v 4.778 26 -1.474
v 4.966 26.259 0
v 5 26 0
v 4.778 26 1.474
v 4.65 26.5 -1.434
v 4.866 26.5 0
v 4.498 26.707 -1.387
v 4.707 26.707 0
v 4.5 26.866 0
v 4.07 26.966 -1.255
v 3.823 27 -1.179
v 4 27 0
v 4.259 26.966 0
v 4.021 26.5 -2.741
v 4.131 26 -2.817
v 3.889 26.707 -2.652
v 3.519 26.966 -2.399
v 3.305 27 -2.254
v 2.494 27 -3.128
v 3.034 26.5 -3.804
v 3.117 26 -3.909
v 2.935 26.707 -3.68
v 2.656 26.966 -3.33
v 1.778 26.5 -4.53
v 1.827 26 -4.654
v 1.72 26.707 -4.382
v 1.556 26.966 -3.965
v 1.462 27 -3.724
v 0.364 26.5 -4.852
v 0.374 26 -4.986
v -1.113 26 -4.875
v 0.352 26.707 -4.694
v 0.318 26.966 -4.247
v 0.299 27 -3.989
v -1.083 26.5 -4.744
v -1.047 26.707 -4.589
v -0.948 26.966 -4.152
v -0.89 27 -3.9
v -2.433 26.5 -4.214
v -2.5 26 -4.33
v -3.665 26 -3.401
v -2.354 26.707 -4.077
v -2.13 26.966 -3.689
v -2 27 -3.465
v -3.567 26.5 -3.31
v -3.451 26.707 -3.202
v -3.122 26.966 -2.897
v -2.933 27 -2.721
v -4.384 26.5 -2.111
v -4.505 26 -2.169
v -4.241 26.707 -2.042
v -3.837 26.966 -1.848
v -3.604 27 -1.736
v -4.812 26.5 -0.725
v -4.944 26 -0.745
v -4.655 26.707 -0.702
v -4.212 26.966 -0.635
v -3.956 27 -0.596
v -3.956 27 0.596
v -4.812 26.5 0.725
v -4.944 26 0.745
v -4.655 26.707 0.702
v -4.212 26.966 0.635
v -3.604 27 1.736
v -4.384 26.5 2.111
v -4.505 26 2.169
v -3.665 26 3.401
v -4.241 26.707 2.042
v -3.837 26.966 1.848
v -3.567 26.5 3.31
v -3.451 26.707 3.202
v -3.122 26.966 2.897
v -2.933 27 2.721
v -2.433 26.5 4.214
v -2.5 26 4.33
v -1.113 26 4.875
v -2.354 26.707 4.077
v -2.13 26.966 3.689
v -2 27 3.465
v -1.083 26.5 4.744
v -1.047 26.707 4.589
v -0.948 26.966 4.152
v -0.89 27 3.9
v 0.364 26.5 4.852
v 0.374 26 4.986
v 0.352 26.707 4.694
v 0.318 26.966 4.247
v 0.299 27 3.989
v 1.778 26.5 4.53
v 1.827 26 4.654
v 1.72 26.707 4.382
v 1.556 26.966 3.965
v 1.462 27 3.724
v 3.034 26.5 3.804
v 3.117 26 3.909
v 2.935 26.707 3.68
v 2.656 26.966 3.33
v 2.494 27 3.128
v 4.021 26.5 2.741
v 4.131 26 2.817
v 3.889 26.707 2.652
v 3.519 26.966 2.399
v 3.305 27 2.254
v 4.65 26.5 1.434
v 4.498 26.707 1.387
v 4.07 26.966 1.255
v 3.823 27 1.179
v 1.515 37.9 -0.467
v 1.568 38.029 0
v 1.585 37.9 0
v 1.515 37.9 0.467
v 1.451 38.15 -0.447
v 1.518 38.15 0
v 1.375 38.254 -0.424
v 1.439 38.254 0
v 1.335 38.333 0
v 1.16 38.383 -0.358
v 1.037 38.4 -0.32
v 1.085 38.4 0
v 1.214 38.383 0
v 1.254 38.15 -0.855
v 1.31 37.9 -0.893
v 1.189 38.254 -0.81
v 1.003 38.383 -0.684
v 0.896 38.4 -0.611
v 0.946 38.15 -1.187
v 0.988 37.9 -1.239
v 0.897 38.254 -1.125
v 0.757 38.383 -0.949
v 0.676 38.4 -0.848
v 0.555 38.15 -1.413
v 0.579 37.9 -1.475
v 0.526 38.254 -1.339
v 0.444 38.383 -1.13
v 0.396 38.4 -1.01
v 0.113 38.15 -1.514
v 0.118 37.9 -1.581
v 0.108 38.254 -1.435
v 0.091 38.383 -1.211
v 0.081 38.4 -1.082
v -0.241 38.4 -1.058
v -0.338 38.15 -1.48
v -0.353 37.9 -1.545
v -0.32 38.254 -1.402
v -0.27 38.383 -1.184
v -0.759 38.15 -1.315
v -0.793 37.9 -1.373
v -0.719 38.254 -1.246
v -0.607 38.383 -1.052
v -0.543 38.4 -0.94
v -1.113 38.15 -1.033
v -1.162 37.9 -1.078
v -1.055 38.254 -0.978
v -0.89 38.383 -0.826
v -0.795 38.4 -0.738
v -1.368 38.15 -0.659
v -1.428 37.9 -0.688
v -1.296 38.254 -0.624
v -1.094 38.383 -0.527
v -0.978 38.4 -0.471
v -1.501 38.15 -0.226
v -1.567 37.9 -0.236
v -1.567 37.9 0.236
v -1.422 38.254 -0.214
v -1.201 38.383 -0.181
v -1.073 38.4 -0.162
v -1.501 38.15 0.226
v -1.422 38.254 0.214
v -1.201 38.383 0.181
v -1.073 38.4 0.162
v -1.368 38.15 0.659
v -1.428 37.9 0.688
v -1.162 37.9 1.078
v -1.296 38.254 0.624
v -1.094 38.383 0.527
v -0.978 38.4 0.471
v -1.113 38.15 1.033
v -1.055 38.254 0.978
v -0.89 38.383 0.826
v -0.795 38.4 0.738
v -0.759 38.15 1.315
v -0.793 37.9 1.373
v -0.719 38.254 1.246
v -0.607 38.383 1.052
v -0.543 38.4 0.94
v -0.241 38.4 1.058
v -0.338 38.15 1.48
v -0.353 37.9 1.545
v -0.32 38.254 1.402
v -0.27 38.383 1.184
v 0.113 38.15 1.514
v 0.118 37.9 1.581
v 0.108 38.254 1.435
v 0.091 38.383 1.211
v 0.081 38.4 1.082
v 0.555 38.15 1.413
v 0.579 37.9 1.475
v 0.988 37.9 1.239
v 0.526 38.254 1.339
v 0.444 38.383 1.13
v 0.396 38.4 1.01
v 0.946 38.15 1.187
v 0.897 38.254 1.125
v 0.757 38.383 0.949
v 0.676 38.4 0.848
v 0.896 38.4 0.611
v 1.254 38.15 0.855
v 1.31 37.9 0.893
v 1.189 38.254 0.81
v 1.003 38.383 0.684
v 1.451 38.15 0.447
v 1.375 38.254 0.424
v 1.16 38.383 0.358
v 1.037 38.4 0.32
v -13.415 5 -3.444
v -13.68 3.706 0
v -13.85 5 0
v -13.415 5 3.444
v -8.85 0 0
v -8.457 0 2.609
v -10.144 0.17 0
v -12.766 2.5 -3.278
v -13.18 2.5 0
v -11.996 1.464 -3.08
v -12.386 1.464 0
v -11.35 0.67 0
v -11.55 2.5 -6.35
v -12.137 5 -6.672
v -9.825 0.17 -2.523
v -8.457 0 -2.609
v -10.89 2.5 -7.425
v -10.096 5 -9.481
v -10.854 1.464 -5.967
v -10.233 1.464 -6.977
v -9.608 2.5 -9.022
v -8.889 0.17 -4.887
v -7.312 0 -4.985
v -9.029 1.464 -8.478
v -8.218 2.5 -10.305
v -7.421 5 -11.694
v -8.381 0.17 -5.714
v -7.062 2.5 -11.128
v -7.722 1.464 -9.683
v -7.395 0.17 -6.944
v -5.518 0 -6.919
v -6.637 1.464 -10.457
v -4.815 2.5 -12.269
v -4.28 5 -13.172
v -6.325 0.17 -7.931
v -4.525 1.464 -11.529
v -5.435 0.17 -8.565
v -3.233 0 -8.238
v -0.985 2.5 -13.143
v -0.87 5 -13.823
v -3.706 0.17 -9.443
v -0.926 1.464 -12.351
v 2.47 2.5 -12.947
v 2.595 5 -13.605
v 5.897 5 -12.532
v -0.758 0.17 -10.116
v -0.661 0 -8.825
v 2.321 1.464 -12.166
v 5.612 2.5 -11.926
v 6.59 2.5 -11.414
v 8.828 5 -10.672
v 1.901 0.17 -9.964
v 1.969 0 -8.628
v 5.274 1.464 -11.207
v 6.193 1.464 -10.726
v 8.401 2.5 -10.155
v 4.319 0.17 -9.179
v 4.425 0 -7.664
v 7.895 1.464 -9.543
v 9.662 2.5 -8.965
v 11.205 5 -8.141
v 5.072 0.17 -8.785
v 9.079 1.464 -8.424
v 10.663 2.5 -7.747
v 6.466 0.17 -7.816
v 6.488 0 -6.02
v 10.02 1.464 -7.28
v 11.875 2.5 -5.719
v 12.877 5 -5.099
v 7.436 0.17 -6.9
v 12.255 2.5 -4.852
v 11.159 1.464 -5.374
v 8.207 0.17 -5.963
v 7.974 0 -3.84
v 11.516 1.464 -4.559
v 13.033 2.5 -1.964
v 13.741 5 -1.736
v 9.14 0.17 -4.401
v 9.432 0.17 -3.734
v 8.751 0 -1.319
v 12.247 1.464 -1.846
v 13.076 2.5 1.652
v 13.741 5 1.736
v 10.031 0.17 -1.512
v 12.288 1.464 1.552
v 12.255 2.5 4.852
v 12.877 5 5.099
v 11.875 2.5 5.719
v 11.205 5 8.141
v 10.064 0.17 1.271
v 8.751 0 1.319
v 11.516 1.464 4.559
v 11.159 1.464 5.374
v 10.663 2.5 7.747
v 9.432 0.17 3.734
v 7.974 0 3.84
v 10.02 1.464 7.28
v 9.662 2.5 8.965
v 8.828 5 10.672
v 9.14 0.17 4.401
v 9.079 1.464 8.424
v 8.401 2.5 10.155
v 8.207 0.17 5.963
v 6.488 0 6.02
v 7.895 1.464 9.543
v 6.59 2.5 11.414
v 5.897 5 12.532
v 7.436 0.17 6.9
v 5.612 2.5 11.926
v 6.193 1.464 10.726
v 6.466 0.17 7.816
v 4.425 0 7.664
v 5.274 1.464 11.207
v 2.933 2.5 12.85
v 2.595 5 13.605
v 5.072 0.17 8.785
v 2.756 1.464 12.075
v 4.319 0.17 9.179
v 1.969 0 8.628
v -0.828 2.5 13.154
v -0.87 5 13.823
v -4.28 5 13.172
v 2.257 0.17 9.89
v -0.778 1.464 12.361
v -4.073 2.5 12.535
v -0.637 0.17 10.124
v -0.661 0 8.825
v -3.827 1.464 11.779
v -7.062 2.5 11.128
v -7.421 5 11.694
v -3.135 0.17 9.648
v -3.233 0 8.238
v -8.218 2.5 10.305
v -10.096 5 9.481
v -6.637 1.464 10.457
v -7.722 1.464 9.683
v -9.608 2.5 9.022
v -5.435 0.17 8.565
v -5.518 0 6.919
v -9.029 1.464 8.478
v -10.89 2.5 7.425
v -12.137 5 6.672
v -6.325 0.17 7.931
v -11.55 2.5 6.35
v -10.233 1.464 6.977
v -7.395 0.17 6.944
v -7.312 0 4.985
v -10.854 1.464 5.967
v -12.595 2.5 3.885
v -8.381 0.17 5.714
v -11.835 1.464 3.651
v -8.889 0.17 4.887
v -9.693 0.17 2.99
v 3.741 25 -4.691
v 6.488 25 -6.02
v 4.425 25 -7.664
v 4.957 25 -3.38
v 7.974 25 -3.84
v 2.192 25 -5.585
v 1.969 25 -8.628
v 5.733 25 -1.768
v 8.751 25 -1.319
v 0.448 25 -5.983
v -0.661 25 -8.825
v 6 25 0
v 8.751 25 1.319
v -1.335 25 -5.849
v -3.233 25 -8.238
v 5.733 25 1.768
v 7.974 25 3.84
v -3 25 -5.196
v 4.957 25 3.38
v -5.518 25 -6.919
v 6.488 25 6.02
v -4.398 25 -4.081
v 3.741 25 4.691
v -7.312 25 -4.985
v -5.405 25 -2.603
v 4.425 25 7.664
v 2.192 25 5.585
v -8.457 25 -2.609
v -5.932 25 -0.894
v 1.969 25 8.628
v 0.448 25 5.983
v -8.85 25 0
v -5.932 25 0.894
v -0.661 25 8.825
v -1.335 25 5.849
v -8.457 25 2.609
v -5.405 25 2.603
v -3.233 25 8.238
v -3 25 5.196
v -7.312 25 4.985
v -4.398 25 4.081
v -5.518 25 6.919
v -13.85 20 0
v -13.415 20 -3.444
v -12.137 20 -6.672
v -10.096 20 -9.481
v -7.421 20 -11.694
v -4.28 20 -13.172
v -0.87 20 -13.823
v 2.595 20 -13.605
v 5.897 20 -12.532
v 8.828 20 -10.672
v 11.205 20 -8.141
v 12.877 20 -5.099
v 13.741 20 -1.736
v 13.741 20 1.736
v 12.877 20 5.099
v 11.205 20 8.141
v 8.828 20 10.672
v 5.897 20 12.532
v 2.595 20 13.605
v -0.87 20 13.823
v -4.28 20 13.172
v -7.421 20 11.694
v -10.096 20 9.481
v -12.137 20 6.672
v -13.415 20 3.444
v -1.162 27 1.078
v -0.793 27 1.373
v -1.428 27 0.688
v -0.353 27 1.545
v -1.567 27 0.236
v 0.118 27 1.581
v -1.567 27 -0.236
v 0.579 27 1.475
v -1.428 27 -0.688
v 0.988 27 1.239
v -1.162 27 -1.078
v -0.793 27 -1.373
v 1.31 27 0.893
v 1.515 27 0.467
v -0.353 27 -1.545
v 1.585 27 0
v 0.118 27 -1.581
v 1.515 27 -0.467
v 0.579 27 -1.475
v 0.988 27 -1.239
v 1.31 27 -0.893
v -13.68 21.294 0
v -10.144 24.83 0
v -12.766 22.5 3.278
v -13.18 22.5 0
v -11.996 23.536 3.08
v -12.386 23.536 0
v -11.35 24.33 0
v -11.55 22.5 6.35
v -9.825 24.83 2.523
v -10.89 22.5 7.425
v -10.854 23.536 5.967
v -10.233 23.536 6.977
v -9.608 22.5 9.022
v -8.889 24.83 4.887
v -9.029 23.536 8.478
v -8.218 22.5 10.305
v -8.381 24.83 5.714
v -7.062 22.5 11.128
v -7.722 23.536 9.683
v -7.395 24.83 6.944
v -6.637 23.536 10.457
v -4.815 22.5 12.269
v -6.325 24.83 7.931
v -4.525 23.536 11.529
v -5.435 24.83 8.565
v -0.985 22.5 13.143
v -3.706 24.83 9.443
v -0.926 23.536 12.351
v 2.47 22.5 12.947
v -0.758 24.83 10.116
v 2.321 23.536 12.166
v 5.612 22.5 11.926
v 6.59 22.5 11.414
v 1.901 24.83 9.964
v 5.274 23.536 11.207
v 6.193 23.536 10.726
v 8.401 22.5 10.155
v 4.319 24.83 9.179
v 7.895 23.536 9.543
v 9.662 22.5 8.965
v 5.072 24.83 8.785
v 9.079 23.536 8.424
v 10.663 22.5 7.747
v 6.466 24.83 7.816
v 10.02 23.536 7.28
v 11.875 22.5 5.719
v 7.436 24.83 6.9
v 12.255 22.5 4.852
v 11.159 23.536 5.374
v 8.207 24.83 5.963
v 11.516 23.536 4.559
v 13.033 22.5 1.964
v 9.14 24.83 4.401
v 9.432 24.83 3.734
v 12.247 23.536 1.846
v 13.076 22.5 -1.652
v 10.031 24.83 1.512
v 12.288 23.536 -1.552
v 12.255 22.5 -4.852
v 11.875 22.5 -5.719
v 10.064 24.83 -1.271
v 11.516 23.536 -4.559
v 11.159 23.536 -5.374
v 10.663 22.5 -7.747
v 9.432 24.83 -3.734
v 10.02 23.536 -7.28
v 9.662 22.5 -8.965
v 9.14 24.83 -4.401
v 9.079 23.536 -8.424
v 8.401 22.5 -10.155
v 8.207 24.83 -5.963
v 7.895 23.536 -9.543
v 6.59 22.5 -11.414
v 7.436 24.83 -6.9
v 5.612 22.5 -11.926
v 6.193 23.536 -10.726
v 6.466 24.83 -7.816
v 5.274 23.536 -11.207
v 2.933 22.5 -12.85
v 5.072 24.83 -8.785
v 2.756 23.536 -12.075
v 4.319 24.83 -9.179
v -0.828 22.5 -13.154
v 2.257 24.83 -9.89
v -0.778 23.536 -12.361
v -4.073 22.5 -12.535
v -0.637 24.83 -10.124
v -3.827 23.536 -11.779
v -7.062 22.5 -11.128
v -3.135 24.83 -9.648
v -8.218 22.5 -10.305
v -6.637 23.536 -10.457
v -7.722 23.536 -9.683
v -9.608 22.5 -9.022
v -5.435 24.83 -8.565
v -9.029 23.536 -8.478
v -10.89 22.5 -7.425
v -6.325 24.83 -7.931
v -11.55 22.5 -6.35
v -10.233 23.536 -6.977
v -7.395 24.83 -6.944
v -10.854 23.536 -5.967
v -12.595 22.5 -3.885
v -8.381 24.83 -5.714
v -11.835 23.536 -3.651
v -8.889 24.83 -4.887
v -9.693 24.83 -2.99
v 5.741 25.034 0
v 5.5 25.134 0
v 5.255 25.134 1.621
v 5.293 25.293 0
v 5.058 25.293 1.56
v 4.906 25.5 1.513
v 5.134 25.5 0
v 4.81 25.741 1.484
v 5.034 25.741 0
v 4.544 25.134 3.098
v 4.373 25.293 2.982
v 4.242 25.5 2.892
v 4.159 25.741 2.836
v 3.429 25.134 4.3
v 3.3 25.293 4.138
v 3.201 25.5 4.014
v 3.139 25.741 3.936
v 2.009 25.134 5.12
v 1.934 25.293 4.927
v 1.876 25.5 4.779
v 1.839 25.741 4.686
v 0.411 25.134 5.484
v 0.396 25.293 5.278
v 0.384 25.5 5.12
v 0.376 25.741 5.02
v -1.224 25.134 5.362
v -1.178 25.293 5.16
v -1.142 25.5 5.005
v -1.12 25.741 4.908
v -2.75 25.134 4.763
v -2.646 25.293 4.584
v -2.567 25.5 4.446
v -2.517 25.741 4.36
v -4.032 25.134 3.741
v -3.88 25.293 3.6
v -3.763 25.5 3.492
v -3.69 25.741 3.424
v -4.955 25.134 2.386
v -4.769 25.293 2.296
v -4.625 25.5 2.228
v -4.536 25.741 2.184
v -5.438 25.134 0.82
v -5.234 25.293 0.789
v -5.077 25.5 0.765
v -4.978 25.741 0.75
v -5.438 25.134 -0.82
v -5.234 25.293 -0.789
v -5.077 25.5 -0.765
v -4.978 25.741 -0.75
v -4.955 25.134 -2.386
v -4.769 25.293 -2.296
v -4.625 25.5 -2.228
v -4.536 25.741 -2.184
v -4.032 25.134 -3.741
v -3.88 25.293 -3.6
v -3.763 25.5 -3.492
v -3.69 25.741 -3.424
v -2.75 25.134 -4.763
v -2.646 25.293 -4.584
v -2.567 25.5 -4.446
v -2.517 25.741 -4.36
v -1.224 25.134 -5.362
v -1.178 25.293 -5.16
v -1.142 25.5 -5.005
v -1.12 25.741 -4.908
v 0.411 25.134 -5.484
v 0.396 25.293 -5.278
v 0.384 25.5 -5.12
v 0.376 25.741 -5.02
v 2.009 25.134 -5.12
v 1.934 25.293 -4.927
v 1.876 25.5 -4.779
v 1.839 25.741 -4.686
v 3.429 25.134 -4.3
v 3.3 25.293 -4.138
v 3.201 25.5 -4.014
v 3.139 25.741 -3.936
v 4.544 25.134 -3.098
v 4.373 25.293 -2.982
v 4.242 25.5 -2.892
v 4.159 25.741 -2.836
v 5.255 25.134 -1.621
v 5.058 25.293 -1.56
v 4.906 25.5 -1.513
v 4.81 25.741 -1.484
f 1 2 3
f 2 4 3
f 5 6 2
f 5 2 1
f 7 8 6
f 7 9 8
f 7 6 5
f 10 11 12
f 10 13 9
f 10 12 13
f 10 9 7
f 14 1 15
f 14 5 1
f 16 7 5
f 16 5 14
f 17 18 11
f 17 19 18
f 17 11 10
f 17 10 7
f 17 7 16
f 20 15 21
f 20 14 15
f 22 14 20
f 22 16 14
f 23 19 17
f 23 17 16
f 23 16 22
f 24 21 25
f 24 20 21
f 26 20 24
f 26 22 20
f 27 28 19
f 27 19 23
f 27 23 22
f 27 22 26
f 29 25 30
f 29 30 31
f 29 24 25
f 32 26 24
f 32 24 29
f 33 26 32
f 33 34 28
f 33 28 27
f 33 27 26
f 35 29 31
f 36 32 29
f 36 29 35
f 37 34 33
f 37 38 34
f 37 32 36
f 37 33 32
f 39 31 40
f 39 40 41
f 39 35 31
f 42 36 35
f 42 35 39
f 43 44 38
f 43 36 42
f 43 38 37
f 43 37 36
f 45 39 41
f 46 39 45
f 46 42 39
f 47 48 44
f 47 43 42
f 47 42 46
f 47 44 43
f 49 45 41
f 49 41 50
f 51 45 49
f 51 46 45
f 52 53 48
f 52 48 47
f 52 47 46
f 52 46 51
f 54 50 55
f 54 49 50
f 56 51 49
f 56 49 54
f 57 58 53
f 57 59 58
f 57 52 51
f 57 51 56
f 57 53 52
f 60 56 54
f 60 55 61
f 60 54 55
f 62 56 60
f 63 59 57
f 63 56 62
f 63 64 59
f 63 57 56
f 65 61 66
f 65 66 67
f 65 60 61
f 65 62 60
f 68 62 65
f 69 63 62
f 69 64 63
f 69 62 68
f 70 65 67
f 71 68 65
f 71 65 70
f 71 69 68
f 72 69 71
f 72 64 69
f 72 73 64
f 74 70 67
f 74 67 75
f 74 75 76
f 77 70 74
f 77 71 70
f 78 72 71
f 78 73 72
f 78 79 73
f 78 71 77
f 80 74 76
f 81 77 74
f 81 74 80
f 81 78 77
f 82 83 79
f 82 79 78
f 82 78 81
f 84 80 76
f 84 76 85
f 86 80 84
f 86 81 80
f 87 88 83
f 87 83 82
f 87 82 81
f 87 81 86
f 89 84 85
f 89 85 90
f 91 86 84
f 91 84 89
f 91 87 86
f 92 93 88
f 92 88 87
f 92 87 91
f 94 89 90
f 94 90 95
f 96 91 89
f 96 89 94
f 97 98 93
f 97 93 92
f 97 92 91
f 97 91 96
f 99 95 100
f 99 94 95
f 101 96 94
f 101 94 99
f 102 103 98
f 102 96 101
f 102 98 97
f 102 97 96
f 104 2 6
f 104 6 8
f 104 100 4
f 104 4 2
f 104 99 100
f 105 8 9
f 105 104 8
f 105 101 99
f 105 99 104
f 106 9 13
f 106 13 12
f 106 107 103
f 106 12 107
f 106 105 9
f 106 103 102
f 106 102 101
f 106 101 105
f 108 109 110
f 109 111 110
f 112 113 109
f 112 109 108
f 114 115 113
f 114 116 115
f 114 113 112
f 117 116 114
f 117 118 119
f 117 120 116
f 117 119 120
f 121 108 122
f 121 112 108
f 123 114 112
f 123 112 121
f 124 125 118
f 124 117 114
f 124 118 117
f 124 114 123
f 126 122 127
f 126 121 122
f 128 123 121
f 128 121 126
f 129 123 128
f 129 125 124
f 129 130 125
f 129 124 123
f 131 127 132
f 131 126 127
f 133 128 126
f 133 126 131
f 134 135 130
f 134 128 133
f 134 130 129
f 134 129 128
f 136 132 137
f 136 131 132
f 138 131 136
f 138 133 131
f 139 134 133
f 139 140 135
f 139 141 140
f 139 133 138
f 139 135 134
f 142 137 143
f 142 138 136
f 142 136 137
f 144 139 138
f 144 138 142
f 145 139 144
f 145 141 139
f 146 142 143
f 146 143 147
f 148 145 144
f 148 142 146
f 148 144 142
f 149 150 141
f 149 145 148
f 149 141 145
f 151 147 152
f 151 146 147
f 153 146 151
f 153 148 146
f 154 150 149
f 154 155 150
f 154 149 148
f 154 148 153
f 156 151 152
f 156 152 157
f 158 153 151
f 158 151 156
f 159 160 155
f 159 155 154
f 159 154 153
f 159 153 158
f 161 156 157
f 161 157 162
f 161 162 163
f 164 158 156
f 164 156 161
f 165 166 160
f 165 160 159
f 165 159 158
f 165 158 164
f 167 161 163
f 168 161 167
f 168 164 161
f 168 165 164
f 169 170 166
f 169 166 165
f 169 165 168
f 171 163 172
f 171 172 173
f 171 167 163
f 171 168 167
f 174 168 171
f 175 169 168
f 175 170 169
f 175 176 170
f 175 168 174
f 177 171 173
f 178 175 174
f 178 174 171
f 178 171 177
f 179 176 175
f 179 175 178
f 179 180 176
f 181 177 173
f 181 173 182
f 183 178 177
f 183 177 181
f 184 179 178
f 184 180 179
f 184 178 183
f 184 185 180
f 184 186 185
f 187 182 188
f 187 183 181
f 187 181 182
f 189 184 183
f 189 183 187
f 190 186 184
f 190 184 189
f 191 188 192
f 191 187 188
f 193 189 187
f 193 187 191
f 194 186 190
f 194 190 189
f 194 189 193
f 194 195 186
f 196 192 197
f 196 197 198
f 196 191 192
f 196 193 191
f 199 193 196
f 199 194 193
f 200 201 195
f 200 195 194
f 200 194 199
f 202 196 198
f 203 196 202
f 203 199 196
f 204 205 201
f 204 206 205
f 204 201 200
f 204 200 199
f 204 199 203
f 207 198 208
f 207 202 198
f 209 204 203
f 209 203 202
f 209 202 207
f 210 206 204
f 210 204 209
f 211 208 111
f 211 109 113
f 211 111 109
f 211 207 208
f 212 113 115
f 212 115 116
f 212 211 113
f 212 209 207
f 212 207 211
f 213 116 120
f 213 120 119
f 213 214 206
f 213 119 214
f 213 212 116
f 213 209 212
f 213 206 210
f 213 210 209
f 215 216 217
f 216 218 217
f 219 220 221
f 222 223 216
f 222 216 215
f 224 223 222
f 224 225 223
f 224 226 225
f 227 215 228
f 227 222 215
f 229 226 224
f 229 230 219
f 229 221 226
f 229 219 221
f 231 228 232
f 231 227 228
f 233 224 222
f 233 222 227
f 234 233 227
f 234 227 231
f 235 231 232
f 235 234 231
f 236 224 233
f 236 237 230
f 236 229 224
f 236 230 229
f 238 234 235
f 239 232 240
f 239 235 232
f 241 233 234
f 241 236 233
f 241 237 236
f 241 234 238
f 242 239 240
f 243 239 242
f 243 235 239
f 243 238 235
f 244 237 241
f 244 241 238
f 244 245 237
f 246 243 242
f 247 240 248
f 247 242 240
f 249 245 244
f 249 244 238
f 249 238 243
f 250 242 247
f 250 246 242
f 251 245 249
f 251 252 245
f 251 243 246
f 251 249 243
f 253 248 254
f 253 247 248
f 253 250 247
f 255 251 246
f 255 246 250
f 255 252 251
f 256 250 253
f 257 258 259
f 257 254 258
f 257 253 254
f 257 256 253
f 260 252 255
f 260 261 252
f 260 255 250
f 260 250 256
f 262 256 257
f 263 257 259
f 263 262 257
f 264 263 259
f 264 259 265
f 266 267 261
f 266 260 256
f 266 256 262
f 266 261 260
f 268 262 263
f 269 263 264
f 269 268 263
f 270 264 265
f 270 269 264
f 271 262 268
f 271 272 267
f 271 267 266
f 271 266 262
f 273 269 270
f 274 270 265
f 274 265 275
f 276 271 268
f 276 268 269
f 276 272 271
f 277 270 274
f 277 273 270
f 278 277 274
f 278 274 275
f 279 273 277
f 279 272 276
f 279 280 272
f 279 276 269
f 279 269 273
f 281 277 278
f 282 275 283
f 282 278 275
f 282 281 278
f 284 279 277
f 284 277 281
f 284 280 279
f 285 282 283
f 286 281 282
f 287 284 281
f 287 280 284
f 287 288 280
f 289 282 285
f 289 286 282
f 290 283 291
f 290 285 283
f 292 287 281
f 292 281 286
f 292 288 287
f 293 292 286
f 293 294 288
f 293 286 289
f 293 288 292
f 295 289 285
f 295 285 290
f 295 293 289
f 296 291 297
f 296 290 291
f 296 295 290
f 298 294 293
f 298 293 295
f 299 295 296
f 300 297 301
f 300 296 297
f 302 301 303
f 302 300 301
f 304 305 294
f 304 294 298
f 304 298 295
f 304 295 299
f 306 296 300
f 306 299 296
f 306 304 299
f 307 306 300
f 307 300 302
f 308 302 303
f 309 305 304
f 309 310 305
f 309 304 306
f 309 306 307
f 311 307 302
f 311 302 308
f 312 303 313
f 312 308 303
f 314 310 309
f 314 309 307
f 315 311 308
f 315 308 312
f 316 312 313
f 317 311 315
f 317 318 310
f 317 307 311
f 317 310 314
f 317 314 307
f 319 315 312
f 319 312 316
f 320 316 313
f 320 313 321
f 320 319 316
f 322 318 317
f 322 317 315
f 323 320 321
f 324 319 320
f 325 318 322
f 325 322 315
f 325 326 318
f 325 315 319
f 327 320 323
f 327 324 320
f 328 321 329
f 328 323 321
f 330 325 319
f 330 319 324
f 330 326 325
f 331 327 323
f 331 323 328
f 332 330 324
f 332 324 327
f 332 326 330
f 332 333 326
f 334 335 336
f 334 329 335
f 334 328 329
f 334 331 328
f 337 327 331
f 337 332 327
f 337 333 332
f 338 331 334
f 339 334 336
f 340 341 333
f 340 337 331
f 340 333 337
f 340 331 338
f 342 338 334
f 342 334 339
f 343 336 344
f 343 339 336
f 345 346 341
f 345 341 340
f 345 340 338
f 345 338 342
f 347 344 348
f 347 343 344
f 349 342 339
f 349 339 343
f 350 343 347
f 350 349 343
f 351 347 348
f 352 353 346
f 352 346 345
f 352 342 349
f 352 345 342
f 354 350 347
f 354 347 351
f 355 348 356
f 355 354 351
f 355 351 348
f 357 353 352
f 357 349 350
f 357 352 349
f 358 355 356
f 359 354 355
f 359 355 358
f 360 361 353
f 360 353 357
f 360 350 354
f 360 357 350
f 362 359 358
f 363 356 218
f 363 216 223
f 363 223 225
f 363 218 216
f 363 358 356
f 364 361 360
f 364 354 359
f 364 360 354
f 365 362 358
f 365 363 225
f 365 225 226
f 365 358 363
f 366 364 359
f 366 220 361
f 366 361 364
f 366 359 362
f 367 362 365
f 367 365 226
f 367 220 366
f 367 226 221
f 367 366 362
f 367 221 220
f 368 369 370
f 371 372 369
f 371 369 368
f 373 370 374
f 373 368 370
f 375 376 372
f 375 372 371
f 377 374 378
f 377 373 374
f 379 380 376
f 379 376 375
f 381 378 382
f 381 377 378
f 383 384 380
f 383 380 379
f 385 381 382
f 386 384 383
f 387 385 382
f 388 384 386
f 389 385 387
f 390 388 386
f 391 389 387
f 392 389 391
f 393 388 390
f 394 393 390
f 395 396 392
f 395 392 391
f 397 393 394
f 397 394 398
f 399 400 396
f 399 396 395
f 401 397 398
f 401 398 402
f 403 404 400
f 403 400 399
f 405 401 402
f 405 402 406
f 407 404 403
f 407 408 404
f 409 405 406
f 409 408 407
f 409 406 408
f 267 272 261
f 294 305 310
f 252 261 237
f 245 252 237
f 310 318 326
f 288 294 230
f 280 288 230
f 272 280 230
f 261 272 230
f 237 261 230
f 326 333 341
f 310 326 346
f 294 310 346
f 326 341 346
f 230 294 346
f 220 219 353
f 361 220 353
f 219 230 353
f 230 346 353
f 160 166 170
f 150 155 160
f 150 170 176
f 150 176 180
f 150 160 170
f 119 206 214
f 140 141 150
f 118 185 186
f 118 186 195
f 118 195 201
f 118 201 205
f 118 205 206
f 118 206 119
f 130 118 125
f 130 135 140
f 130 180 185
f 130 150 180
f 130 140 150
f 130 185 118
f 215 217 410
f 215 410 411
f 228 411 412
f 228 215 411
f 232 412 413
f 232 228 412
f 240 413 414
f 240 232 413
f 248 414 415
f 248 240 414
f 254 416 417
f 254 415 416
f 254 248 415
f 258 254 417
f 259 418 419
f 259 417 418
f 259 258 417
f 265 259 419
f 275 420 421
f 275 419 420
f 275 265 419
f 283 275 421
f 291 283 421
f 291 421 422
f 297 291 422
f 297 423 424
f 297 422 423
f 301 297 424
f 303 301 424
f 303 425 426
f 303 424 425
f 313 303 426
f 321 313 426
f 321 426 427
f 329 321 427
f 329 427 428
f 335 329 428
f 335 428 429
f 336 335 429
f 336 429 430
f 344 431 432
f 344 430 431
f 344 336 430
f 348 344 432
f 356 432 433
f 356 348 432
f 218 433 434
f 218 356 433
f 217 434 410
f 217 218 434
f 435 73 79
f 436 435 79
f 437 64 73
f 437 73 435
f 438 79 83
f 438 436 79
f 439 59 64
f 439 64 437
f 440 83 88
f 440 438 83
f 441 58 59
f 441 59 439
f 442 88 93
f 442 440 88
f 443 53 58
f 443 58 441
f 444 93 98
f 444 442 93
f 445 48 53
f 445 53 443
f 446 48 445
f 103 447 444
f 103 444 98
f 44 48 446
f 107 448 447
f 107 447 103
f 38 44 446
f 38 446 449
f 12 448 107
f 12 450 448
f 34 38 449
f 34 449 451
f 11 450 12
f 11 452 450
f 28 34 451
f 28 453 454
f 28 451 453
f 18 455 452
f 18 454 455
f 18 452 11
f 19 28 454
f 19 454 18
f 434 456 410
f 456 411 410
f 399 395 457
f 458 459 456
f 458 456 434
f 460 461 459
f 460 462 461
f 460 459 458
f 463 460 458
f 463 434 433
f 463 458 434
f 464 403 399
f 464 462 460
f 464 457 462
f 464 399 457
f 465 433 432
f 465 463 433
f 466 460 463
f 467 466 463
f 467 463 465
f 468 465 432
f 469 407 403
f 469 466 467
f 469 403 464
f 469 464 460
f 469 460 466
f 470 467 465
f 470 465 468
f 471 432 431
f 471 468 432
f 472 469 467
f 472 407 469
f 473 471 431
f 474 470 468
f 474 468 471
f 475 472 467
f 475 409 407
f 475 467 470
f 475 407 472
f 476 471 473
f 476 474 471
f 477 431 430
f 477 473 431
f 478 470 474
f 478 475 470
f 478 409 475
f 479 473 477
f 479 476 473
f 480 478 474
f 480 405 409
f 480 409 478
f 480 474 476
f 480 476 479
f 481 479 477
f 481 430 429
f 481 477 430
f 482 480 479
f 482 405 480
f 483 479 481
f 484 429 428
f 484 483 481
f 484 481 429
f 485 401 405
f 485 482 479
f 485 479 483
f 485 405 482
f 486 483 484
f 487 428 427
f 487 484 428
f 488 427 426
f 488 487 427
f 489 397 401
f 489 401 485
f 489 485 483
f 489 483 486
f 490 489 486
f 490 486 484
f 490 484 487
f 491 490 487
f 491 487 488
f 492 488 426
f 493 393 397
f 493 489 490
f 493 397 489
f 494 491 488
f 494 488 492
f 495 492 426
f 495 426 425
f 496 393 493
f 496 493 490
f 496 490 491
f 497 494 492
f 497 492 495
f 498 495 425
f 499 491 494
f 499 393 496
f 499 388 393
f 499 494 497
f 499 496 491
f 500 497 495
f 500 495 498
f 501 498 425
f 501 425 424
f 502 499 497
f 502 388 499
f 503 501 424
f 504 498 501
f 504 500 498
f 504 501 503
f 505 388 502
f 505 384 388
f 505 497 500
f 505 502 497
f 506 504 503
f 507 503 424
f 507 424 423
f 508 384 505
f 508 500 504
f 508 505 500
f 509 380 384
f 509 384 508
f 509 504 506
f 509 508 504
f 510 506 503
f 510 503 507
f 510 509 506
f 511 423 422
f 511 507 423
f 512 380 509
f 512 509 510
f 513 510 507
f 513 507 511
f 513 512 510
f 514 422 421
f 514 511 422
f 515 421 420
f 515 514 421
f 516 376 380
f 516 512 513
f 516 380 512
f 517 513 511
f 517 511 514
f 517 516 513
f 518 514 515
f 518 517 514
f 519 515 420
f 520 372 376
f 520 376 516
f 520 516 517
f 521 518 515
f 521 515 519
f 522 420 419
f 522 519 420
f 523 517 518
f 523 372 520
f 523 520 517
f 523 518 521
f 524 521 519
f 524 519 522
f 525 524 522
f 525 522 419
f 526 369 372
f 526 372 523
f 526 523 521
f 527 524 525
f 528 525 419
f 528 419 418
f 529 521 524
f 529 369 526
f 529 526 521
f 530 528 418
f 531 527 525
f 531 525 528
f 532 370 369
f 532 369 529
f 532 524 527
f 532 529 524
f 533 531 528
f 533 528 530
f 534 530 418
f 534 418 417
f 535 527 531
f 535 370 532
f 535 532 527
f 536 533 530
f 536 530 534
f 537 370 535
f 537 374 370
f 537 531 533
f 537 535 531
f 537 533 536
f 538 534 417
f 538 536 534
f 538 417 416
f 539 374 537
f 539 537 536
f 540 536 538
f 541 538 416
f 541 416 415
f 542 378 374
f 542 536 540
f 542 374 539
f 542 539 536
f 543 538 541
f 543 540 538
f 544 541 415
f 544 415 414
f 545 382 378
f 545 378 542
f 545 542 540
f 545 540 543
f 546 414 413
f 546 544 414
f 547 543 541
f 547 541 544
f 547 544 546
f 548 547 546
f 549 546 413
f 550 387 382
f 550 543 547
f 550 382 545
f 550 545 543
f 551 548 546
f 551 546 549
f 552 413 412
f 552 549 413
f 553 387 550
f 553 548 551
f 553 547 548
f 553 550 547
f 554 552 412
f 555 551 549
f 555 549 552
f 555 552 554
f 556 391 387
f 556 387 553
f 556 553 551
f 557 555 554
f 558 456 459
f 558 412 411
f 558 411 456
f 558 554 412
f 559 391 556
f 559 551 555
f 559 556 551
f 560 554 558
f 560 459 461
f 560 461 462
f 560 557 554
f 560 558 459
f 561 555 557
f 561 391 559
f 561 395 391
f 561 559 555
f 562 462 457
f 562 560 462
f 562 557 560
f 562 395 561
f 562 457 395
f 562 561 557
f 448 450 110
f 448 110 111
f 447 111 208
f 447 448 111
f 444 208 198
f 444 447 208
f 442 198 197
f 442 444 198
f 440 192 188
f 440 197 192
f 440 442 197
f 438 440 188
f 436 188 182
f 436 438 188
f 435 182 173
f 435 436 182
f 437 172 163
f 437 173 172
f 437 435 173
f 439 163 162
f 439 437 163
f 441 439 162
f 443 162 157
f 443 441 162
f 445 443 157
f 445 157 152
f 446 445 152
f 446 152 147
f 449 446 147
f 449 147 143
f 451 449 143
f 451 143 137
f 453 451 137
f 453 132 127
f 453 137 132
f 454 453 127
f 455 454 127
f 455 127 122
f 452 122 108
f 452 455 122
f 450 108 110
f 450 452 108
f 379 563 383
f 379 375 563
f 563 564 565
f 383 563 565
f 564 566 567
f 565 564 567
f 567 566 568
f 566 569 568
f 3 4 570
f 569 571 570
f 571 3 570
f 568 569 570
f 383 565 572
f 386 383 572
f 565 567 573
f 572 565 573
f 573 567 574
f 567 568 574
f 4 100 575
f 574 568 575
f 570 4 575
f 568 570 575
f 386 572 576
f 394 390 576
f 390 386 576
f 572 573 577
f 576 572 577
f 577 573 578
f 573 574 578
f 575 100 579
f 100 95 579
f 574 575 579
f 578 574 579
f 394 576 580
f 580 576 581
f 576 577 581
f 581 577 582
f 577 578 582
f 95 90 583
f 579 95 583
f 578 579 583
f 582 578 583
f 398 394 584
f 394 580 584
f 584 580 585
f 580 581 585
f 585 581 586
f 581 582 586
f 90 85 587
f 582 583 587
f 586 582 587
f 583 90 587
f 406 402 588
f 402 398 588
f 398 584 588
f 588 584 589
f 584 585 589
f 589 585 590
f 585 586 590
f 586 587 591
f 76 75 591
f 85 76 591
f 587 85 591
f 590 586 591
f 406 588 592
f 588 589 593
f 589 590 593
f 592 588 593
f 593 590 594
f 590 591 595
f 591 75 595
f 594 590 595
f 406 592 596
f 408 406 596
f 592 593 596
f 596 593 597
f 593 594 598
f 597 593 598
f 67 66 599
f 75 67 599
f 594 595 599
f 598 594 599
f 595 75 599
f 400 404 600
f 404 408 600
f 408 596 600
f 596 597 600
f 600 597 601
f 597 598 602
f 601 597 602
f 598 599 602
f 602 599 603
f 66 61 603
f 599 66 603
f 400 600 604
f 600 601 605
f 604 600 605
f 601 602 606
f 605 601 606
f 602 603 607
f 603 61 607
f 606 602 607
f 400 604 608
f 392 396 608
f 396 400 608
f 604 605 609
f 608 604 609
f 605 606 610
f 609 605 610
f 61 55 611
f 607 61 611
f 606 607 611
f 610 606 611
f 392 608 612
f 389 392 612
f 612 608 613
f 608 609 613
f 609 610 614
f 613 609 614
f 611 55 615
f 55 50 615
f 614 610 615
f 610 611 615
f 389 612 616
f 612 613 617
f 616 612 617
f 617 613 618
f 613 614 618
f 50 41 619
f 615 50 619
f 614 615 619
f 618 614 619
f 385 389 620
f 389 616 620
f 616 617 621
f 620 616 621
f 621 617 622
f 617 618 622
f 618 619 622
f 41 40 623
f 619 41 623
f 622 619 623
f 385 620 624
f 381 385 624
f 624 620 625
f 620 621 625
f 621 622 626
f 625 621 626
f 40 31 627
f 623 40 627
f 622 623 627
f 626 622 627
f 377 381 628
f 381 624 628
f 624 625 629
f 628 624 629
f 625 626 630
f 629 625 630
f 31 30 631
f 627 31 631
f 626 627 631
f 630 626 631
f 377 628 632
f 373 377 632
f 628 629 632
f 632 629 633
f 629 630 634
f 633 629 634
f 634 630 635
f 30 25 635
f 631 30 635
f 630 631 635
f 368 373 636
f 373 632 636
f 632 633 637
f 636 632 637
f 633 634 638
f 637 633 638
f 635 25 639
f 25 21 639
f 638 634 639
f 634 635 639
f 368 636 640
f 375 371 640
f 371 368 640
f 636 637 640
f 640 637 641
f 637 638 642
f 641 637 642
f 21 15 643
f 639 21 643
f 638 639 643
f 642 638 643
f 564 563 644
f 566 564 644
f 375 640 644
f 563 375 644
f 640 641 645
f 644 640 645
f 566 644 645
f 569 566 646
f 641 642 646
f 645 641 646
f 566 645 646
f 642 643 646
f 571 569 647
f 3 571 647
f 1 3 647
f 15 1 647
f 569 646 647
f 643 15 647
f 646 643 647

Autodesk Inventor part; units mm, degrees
ref_plane "YZ Plane" through (0, 0, 0) normal (1, 0, 0) x (0, 1, 0)
ref_plane "XZ Plane" through (0, 0, 0) normal (0, 1, 0) x (-1, 0, 0)
ref_plane "XY Plane" through (0, 0, 0) normal (0, 0, 1) x (1, 0, 0)
sketch "Sketch1" plane through (0, 0, 0) normal (0, 1, 0) x (-1, 0, 0)
  point P0 (0, 0)
sketch "Sketch2" plane through (0, 0, 0) normal (0, 1, 0) x (-1, 0, 0)
  circle A0 centre (0, 0) radius 13.85
  dimension "d0" = 27.7
extrude "Extrusion1" add sketch "Sketch2" along normal blind 25
sketch "Sketch3" plane through (0, 25, 0) normal (0, 1, 0) x (1, 0, 0)
  circle A0 centre (0, 0) radius 13.85 projected
  circle A1 centre (0, 0) radius 5
  dimension "d3" = 10
extrude "Extrusion2" add sketch "Sketch3" along normal blind 2 contours A1
sketch "Sketch4" plane through (0, 27, 0) normal (0, 1, 0) x (1, 0, 0)
  circle A0 centre (0, 0) radius 1.585
  dimension "d6" = 3.17
extrude "Extrusion3" add sketch "Sketch4" along normal blind 11.4
fillet "Fillet1" radius 5 2 edges at (13.85, 0, 0) (13.85, 25, 0)
fillet "Fillet2" radius 1 2 edges at (-5, 27, 0) (-5, 25, 0)
fillet "Fillet3" radius 0.5 1 edges at (-1.585, 38.4, 0)
properties part number "Motor"
